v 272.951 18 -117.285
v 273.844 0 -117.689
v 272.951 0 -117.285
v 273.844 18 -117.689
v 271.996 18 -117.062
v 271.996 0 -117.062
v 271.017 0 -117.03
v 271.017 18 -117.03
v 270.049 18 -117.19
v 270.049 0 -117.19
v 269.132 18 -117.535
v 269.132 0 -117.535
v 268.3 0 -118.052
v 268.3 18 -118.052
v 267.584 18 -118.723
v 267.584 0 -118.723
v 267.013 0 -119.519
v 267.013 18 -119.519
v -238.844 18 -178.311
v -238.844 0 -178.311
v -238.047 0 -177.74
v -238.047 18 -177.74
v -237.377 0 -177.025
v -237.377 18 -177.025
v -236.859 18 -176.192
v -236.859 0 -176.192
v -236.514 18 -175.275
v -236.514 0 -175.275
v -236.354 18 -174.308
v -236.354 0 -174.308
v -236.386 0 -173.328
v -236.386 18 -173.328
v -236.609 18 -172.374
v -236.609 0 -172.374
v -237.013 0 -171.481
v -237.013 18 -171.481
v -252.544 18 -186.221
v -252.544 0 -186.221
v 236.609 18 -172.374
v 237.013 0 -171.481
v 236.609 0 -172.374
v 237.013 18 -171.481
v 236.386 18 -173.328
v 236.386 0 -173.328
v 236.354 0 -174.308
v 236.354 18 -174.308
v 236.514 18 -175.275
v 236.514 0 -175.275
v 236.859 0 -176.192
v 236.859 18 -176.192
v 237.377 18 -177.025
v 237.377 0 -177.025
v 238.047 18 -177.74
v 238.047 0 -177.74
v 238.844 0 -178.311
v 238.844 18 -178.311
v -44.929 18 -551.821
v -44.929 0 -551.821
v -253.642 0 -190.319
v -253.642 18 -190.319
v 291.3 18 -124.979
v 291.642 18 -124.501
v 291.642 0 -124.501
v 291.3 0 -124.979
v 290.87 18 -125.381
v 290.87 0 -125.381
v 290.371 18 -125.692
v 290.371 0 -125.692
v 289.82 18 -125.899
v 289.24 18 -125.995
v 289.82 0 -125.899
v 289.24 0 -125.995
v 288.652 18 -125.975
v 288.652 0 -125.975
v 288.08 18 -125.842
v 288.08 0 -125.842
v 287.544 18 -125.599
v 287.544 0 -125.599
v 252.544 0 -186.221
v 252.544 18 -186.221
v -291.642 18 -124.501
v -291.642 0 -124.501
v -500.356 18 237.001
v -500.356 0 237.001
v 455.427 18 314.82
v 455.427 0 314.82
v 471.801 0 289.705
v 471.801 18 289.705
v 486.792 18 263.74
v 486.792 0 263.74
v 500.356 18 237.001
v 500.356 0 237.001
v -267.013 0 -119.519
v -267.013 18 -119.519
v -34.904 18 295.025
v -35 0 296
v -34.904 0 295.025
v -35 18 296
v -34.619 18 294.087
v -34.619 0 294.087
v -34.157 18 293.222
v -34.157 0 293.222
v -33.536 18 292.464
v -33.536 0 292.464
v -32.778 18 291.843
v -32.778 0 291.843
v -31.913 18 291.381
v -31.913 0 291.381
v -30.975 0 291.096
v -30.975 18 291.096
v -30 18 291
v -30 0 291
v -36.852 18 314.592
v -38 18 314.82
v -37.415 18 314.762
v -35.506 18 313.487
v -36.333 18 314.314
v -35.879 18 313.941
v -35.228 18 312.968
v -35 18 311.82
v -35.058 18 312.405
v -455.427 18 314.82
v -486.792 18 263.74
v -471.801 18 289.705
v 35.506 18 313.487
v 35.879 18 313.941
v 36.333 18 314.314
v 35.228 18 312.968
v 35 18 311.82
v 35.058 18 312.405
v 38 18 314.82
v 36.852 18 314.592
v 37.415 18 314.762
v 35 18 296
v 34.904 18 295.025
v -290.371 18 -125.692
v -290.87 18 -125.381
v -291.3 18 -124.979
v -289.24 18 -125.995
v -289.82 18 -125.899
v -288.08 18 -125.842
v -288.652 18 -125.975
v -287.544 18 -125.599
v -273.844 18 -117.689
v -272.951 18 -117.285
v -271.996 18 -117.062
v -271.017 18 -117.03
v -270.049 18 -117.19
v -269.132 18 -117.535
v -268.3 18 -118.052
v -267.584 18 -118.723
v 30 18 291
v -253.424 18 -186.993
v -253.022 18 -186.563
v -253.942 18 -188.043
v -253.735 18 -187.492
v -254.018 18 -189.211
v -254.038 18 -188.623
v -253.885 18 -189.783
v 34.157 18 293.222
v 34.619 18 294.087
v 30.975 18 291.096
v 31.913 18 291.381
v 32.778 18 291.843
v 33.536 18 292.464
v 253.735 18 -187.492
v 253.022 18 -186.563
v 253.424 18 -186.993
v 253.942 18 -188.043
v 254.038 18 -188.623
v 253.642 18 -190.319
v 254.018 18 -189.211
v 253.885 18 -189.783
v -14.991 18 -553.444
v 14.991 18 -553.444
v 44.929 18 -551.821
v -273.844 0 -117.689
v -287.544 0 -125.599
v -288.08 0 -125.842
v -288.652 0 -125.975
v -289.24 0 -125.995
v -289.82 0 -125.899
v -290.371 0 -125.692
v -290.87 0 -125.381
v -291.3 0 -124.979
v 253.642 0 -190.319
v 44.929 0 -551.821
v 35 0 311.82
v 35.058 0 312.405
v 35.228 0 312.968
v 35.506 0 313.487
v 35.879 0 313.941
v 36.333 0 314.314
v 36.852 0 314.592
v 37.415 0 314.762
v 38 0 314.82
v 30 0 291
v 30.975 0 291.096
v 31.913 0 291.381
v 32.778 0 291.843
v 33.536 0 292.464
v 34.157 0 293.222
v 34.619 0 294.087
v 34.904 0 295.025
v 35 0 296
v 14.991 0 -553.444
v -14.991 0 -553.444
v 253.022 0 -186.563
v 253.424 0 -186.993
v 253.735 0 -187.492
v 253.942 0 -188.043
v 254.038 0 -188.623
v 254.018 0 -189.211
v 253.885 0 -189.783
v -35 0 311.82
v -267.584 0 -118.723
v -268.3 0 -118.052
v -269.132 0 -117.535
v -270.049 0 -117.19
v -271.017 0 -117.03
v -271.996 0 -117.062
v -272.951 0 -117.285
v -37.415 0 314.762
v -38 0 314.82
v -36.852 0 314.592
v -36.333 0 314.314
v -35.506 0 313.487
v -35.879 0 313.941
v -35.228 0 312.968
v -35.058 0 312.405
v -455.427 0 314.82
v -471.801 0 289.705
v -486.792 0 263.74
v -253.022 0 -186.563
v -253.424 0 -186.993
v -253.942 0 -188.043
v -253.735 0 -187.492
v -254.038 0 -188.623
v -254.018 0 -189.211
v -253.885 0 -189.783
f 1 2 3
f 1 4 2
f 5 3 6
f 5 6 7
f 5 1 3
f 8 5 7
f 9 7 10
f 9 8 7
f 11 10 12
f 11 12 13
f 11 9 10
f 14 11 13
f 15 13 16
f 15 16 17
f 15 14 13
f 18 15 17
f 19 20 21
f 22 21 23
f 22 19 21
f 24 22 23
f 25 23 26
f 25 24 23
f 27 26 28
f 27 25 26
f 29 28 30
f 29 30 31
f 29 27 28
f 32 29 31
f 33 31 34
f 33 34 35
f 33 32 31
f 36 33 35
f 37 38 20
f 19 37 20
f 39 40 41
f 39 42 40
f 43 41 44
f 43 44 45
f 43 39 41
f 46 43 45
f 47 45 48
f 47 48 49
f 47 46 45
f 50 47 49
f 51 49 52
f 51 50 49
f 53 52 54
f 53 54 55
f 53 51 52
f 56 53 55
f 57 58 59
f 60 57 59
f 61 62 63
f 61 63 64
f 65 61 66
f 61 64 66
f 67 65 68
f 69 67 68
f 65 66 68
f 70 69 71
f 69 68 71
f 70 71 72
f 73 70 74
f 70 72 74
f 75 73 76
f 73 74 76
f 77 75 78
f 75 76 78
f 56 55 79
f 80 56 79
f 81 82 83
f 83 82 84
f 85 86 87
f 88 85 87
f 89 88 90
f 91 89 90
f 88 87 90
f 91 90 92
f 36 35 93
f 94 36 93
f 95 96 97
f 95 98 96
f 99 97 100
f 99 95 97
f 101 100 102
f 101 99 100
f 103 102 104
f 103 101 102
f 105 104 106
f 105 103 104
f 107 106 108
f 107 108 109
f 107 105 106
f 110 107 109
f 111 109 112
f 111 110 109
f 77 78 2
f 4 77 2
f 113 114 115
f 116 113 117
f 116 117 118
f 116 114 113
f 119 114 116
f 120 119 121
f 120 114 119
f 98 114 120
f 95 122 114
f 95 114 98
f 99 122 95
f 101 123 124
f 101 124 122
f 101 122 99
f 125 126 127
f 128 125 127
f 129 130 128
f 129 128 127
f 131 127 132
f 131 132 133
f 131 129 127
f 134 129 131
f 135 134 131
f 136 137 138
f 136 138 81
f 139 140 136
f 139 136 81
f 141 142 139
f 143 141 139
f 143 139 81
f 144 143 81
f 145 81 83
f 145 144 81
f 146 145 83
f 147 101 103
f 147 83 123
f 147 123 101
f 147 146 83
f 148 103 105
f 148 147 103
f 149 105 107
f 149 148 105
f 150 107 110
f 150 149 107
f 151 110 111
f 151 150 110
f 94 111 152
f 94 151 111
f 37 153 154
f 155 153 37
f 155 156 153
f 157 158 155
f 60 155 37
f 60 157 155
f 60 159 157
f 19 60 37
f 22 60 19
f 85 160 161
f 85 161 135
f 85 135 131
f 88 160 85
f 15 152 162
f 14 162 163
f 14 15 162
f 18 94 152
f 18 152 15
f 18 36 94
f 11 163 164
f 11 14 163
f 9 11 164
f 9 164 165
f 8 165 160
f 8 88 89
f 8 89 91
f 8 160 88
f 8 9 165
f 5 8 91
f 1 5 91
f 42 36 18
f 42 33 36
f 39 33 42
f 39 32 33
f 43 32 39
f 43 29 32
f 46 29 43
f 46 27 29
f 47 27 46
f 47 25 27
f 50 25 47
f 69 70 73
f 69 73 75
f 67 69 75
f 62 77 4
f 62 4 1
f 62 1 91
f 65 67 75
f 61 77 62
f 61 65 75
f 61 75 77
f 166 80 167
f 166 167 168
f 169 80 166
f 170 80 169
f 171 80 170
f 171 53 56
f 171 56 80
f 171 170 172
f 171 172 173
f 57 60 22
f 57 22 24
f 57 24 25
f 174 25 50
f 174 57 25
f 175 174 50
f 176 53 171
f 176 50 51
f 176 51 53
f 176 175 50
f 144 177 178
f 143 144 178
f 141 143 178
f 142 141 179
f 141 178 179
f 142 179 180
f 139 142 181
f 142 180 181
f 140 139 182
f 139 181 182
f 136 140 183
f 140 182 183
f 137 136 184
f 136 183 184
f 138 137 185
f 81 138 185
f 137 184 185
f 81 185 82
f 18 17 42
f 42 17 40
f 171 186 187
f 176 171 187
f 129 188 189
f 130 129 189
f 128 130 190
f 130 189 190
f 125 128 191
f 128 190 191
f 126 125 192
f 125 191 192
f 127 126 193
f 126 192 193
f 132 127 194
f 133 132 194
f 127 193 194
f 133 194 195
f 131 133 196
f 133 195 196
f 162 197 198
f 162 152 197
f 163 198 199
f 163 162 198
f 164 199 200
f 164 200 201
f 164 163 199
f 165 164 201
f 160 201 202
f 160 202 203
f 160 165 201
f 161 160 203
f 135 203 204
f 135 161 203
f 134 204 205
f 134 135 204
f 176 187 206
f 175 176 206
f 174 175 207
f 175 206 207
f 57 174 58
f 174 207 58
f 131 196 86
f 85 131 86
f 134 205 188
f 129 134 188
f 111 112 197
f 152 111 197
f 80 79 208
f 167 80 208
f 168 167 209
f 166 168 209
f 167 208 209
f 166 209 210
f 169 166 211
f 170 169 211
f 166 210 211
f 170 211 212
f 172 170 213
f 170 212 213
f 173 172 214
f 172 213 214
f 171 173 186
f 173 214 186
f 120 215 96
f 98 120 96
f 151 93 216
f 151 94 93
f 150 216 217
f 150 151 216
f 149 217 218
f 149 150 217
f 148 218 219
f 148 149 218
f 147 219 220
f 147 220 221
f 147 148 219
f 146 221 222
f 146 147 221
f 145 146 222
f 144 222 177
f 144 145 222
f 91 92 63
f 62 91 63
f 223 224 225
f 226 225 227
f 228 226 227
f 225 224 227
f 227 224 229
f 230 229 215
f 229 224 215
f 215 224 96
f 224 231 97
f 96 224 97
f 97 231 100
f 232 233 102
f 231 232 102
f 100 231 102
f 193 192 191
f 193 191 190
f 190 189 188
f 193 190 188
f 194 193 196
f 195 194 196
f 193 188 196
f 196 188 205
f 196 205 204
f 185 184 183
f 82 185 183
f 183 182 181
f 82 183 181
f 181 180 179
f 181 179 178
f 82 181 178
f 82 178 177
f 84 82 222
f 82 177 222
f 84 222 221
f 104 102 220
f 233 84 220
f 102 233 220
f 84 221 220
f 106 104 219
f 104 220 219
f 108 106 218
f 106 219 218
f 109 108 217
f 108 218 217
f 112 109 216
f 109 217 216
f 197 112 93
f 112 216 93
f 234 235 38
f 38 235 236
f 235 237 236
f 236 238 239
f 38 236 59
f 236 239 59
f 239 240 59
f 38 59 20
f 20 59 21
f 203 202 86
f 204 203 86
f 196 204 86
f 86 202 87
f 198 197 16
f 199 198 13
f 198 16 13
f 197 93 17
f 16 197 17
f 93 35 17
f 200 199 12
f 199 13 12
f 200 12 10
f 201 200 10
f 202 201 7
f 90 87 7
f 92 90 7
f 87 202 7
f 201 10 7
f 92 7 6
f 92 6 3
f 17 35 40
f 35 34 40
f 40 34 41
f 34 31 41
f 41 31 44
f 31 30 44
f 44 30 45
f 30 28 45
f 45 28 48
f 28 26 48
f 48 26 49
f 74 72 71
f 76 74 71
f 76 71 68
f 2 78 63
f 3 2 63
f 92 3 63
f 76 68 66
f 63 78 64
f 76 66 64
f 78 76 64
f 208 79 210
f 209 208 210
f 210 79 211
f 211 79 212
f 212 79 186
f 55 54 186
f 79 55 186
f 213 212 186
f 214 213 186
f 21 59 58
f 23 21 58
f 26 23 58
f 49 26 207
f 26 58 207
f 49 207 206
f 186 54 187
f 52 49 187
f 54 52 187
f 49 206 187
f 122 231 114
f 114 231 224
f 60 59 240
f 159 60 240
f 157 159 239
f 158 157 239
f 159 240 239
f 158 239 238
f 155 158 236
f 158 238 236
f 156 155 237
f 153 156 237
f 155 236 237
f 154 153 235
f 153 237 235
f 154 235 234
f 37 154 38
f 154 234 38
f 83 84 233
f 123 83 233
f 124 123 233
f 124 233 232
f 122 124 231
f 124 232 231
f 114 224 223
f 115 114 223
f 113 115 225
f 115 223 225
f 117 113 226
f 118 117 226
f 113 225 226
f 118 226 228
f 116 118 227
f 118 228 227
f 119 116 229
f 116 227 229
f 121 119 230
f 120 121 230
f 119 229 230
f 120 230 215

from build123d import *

# Parameters (mm, degrees)
BOSS_EXTRUDE1_DEPTH = 18
FILLET1_R           = 5


with BuildPart() as part:
    # Sketch1 → Boss-Extrude1 (new body)
    with BuildSketch(Plane(origin=(0, 0, 0), x_dir=(1, 0, 0), z_dir=(0, 1, 0))):
        with BuildLine():
            Line((-455.426852277, -314.819999892), (-38.000000187, -314.819999892))
            ThreePointArc((-38.000000187, -314.819999892), (-35.878679843, -313.941320236), (-35.000000187, -311.819999892))
            Line((-35.000000187, -311.819999892), (-35.000000187, -290.999999892))
            Line((-35.000000187, -290.999999892), (34.999999813, -290.999999892))
            Line((34.999999813, -290.999999892), (34.999999813, -311.819999892))
            ThreePointArc((34.999999813, -311.819999892), (35.87867947, -313.941320236), (37.999999813, -314.819999892))
            Line((37.999999813, -314.819999892), (455.426851904, -314.819999892))
            ThreePointArc((455.426851904, -314.819999892), (479.472561657, -276.823612404), (500.355543579, -237.001223154))
            Line((500.355543579, -237.001223154), (291.642117601, 124.501034862))
            ThreePointArc((291.642117601, 124.501034862), (289.820498525, 125.898812341), (287.54404139, 125.599111073))
            Line((287.54404139, 125.599111073), (269.513392244, 115.189110935))
            Line((269.513392244, 115.189110935), (234.513392244, 175.8108892))
            Line((234.513392244, 175.8108892), (252.544041237, 186.220889249))
            ThreePointArc((252.544041237, 186.220889249), (253.941818715, 188.042508325), (253.642117448, 190.318965461))
            Line((253.642117448, 190.318965461), (44.928691409, 551.821223582))
            ThreePointArc((44.928691409, 551.821223582), (-7e-08, 553.647225338), (-44.928691549, 551.821223601))
            Line((-44.928691549, 551.821223601), (-253.642117655, 190.318965363))
            ThreePointArc((-253.642117655, 190.318965363), (-253.941818922, 188.042508228), (-252.544041443, 186.220889153))
            Line((-252.544041443, 186.220889153), (-234.513392501, 175.810889132))
            Line((-234.513392501, 175.810889132), (-269.513392501, 115.189110868))
            Line((-269.513392501, 115.189110868), (-287.544041036, 125.599110653))
            ThreePointArc((-287.544041036, 125.599110653), (-289.820498172, 125.89881192), (-291.642117248, 124.50103444))
            Line((-291.642117248, 124.50103444), (-500.355543515, -237.001224077))
            ThreePointArc((-500.355543515, -237.001224077), (-479.472561775, -276.823612847), (-455.426852277, -314.819999892))
        make_face()
    extrude(amount=BOSS_EXTRUDE1_DEPTH)

    # Fillet1
    fillet1_edges = [part.edges().sort_by_distance(p)[0] for p in [
        (-269.513392501, 9, -115.189110868),
        (-234.513392501, 9, -175.810889132),
        (234.513392244, 9, -175.8108892),
        (269.513392244, 9, -115.189110935),
        (34.999999813, 9, 290.999999892),
        (-35.000000187, 9, 290.999999892),
    ]]
    fillet(fillet1_edges, radius=FILLET1_R)


solid = part.part
